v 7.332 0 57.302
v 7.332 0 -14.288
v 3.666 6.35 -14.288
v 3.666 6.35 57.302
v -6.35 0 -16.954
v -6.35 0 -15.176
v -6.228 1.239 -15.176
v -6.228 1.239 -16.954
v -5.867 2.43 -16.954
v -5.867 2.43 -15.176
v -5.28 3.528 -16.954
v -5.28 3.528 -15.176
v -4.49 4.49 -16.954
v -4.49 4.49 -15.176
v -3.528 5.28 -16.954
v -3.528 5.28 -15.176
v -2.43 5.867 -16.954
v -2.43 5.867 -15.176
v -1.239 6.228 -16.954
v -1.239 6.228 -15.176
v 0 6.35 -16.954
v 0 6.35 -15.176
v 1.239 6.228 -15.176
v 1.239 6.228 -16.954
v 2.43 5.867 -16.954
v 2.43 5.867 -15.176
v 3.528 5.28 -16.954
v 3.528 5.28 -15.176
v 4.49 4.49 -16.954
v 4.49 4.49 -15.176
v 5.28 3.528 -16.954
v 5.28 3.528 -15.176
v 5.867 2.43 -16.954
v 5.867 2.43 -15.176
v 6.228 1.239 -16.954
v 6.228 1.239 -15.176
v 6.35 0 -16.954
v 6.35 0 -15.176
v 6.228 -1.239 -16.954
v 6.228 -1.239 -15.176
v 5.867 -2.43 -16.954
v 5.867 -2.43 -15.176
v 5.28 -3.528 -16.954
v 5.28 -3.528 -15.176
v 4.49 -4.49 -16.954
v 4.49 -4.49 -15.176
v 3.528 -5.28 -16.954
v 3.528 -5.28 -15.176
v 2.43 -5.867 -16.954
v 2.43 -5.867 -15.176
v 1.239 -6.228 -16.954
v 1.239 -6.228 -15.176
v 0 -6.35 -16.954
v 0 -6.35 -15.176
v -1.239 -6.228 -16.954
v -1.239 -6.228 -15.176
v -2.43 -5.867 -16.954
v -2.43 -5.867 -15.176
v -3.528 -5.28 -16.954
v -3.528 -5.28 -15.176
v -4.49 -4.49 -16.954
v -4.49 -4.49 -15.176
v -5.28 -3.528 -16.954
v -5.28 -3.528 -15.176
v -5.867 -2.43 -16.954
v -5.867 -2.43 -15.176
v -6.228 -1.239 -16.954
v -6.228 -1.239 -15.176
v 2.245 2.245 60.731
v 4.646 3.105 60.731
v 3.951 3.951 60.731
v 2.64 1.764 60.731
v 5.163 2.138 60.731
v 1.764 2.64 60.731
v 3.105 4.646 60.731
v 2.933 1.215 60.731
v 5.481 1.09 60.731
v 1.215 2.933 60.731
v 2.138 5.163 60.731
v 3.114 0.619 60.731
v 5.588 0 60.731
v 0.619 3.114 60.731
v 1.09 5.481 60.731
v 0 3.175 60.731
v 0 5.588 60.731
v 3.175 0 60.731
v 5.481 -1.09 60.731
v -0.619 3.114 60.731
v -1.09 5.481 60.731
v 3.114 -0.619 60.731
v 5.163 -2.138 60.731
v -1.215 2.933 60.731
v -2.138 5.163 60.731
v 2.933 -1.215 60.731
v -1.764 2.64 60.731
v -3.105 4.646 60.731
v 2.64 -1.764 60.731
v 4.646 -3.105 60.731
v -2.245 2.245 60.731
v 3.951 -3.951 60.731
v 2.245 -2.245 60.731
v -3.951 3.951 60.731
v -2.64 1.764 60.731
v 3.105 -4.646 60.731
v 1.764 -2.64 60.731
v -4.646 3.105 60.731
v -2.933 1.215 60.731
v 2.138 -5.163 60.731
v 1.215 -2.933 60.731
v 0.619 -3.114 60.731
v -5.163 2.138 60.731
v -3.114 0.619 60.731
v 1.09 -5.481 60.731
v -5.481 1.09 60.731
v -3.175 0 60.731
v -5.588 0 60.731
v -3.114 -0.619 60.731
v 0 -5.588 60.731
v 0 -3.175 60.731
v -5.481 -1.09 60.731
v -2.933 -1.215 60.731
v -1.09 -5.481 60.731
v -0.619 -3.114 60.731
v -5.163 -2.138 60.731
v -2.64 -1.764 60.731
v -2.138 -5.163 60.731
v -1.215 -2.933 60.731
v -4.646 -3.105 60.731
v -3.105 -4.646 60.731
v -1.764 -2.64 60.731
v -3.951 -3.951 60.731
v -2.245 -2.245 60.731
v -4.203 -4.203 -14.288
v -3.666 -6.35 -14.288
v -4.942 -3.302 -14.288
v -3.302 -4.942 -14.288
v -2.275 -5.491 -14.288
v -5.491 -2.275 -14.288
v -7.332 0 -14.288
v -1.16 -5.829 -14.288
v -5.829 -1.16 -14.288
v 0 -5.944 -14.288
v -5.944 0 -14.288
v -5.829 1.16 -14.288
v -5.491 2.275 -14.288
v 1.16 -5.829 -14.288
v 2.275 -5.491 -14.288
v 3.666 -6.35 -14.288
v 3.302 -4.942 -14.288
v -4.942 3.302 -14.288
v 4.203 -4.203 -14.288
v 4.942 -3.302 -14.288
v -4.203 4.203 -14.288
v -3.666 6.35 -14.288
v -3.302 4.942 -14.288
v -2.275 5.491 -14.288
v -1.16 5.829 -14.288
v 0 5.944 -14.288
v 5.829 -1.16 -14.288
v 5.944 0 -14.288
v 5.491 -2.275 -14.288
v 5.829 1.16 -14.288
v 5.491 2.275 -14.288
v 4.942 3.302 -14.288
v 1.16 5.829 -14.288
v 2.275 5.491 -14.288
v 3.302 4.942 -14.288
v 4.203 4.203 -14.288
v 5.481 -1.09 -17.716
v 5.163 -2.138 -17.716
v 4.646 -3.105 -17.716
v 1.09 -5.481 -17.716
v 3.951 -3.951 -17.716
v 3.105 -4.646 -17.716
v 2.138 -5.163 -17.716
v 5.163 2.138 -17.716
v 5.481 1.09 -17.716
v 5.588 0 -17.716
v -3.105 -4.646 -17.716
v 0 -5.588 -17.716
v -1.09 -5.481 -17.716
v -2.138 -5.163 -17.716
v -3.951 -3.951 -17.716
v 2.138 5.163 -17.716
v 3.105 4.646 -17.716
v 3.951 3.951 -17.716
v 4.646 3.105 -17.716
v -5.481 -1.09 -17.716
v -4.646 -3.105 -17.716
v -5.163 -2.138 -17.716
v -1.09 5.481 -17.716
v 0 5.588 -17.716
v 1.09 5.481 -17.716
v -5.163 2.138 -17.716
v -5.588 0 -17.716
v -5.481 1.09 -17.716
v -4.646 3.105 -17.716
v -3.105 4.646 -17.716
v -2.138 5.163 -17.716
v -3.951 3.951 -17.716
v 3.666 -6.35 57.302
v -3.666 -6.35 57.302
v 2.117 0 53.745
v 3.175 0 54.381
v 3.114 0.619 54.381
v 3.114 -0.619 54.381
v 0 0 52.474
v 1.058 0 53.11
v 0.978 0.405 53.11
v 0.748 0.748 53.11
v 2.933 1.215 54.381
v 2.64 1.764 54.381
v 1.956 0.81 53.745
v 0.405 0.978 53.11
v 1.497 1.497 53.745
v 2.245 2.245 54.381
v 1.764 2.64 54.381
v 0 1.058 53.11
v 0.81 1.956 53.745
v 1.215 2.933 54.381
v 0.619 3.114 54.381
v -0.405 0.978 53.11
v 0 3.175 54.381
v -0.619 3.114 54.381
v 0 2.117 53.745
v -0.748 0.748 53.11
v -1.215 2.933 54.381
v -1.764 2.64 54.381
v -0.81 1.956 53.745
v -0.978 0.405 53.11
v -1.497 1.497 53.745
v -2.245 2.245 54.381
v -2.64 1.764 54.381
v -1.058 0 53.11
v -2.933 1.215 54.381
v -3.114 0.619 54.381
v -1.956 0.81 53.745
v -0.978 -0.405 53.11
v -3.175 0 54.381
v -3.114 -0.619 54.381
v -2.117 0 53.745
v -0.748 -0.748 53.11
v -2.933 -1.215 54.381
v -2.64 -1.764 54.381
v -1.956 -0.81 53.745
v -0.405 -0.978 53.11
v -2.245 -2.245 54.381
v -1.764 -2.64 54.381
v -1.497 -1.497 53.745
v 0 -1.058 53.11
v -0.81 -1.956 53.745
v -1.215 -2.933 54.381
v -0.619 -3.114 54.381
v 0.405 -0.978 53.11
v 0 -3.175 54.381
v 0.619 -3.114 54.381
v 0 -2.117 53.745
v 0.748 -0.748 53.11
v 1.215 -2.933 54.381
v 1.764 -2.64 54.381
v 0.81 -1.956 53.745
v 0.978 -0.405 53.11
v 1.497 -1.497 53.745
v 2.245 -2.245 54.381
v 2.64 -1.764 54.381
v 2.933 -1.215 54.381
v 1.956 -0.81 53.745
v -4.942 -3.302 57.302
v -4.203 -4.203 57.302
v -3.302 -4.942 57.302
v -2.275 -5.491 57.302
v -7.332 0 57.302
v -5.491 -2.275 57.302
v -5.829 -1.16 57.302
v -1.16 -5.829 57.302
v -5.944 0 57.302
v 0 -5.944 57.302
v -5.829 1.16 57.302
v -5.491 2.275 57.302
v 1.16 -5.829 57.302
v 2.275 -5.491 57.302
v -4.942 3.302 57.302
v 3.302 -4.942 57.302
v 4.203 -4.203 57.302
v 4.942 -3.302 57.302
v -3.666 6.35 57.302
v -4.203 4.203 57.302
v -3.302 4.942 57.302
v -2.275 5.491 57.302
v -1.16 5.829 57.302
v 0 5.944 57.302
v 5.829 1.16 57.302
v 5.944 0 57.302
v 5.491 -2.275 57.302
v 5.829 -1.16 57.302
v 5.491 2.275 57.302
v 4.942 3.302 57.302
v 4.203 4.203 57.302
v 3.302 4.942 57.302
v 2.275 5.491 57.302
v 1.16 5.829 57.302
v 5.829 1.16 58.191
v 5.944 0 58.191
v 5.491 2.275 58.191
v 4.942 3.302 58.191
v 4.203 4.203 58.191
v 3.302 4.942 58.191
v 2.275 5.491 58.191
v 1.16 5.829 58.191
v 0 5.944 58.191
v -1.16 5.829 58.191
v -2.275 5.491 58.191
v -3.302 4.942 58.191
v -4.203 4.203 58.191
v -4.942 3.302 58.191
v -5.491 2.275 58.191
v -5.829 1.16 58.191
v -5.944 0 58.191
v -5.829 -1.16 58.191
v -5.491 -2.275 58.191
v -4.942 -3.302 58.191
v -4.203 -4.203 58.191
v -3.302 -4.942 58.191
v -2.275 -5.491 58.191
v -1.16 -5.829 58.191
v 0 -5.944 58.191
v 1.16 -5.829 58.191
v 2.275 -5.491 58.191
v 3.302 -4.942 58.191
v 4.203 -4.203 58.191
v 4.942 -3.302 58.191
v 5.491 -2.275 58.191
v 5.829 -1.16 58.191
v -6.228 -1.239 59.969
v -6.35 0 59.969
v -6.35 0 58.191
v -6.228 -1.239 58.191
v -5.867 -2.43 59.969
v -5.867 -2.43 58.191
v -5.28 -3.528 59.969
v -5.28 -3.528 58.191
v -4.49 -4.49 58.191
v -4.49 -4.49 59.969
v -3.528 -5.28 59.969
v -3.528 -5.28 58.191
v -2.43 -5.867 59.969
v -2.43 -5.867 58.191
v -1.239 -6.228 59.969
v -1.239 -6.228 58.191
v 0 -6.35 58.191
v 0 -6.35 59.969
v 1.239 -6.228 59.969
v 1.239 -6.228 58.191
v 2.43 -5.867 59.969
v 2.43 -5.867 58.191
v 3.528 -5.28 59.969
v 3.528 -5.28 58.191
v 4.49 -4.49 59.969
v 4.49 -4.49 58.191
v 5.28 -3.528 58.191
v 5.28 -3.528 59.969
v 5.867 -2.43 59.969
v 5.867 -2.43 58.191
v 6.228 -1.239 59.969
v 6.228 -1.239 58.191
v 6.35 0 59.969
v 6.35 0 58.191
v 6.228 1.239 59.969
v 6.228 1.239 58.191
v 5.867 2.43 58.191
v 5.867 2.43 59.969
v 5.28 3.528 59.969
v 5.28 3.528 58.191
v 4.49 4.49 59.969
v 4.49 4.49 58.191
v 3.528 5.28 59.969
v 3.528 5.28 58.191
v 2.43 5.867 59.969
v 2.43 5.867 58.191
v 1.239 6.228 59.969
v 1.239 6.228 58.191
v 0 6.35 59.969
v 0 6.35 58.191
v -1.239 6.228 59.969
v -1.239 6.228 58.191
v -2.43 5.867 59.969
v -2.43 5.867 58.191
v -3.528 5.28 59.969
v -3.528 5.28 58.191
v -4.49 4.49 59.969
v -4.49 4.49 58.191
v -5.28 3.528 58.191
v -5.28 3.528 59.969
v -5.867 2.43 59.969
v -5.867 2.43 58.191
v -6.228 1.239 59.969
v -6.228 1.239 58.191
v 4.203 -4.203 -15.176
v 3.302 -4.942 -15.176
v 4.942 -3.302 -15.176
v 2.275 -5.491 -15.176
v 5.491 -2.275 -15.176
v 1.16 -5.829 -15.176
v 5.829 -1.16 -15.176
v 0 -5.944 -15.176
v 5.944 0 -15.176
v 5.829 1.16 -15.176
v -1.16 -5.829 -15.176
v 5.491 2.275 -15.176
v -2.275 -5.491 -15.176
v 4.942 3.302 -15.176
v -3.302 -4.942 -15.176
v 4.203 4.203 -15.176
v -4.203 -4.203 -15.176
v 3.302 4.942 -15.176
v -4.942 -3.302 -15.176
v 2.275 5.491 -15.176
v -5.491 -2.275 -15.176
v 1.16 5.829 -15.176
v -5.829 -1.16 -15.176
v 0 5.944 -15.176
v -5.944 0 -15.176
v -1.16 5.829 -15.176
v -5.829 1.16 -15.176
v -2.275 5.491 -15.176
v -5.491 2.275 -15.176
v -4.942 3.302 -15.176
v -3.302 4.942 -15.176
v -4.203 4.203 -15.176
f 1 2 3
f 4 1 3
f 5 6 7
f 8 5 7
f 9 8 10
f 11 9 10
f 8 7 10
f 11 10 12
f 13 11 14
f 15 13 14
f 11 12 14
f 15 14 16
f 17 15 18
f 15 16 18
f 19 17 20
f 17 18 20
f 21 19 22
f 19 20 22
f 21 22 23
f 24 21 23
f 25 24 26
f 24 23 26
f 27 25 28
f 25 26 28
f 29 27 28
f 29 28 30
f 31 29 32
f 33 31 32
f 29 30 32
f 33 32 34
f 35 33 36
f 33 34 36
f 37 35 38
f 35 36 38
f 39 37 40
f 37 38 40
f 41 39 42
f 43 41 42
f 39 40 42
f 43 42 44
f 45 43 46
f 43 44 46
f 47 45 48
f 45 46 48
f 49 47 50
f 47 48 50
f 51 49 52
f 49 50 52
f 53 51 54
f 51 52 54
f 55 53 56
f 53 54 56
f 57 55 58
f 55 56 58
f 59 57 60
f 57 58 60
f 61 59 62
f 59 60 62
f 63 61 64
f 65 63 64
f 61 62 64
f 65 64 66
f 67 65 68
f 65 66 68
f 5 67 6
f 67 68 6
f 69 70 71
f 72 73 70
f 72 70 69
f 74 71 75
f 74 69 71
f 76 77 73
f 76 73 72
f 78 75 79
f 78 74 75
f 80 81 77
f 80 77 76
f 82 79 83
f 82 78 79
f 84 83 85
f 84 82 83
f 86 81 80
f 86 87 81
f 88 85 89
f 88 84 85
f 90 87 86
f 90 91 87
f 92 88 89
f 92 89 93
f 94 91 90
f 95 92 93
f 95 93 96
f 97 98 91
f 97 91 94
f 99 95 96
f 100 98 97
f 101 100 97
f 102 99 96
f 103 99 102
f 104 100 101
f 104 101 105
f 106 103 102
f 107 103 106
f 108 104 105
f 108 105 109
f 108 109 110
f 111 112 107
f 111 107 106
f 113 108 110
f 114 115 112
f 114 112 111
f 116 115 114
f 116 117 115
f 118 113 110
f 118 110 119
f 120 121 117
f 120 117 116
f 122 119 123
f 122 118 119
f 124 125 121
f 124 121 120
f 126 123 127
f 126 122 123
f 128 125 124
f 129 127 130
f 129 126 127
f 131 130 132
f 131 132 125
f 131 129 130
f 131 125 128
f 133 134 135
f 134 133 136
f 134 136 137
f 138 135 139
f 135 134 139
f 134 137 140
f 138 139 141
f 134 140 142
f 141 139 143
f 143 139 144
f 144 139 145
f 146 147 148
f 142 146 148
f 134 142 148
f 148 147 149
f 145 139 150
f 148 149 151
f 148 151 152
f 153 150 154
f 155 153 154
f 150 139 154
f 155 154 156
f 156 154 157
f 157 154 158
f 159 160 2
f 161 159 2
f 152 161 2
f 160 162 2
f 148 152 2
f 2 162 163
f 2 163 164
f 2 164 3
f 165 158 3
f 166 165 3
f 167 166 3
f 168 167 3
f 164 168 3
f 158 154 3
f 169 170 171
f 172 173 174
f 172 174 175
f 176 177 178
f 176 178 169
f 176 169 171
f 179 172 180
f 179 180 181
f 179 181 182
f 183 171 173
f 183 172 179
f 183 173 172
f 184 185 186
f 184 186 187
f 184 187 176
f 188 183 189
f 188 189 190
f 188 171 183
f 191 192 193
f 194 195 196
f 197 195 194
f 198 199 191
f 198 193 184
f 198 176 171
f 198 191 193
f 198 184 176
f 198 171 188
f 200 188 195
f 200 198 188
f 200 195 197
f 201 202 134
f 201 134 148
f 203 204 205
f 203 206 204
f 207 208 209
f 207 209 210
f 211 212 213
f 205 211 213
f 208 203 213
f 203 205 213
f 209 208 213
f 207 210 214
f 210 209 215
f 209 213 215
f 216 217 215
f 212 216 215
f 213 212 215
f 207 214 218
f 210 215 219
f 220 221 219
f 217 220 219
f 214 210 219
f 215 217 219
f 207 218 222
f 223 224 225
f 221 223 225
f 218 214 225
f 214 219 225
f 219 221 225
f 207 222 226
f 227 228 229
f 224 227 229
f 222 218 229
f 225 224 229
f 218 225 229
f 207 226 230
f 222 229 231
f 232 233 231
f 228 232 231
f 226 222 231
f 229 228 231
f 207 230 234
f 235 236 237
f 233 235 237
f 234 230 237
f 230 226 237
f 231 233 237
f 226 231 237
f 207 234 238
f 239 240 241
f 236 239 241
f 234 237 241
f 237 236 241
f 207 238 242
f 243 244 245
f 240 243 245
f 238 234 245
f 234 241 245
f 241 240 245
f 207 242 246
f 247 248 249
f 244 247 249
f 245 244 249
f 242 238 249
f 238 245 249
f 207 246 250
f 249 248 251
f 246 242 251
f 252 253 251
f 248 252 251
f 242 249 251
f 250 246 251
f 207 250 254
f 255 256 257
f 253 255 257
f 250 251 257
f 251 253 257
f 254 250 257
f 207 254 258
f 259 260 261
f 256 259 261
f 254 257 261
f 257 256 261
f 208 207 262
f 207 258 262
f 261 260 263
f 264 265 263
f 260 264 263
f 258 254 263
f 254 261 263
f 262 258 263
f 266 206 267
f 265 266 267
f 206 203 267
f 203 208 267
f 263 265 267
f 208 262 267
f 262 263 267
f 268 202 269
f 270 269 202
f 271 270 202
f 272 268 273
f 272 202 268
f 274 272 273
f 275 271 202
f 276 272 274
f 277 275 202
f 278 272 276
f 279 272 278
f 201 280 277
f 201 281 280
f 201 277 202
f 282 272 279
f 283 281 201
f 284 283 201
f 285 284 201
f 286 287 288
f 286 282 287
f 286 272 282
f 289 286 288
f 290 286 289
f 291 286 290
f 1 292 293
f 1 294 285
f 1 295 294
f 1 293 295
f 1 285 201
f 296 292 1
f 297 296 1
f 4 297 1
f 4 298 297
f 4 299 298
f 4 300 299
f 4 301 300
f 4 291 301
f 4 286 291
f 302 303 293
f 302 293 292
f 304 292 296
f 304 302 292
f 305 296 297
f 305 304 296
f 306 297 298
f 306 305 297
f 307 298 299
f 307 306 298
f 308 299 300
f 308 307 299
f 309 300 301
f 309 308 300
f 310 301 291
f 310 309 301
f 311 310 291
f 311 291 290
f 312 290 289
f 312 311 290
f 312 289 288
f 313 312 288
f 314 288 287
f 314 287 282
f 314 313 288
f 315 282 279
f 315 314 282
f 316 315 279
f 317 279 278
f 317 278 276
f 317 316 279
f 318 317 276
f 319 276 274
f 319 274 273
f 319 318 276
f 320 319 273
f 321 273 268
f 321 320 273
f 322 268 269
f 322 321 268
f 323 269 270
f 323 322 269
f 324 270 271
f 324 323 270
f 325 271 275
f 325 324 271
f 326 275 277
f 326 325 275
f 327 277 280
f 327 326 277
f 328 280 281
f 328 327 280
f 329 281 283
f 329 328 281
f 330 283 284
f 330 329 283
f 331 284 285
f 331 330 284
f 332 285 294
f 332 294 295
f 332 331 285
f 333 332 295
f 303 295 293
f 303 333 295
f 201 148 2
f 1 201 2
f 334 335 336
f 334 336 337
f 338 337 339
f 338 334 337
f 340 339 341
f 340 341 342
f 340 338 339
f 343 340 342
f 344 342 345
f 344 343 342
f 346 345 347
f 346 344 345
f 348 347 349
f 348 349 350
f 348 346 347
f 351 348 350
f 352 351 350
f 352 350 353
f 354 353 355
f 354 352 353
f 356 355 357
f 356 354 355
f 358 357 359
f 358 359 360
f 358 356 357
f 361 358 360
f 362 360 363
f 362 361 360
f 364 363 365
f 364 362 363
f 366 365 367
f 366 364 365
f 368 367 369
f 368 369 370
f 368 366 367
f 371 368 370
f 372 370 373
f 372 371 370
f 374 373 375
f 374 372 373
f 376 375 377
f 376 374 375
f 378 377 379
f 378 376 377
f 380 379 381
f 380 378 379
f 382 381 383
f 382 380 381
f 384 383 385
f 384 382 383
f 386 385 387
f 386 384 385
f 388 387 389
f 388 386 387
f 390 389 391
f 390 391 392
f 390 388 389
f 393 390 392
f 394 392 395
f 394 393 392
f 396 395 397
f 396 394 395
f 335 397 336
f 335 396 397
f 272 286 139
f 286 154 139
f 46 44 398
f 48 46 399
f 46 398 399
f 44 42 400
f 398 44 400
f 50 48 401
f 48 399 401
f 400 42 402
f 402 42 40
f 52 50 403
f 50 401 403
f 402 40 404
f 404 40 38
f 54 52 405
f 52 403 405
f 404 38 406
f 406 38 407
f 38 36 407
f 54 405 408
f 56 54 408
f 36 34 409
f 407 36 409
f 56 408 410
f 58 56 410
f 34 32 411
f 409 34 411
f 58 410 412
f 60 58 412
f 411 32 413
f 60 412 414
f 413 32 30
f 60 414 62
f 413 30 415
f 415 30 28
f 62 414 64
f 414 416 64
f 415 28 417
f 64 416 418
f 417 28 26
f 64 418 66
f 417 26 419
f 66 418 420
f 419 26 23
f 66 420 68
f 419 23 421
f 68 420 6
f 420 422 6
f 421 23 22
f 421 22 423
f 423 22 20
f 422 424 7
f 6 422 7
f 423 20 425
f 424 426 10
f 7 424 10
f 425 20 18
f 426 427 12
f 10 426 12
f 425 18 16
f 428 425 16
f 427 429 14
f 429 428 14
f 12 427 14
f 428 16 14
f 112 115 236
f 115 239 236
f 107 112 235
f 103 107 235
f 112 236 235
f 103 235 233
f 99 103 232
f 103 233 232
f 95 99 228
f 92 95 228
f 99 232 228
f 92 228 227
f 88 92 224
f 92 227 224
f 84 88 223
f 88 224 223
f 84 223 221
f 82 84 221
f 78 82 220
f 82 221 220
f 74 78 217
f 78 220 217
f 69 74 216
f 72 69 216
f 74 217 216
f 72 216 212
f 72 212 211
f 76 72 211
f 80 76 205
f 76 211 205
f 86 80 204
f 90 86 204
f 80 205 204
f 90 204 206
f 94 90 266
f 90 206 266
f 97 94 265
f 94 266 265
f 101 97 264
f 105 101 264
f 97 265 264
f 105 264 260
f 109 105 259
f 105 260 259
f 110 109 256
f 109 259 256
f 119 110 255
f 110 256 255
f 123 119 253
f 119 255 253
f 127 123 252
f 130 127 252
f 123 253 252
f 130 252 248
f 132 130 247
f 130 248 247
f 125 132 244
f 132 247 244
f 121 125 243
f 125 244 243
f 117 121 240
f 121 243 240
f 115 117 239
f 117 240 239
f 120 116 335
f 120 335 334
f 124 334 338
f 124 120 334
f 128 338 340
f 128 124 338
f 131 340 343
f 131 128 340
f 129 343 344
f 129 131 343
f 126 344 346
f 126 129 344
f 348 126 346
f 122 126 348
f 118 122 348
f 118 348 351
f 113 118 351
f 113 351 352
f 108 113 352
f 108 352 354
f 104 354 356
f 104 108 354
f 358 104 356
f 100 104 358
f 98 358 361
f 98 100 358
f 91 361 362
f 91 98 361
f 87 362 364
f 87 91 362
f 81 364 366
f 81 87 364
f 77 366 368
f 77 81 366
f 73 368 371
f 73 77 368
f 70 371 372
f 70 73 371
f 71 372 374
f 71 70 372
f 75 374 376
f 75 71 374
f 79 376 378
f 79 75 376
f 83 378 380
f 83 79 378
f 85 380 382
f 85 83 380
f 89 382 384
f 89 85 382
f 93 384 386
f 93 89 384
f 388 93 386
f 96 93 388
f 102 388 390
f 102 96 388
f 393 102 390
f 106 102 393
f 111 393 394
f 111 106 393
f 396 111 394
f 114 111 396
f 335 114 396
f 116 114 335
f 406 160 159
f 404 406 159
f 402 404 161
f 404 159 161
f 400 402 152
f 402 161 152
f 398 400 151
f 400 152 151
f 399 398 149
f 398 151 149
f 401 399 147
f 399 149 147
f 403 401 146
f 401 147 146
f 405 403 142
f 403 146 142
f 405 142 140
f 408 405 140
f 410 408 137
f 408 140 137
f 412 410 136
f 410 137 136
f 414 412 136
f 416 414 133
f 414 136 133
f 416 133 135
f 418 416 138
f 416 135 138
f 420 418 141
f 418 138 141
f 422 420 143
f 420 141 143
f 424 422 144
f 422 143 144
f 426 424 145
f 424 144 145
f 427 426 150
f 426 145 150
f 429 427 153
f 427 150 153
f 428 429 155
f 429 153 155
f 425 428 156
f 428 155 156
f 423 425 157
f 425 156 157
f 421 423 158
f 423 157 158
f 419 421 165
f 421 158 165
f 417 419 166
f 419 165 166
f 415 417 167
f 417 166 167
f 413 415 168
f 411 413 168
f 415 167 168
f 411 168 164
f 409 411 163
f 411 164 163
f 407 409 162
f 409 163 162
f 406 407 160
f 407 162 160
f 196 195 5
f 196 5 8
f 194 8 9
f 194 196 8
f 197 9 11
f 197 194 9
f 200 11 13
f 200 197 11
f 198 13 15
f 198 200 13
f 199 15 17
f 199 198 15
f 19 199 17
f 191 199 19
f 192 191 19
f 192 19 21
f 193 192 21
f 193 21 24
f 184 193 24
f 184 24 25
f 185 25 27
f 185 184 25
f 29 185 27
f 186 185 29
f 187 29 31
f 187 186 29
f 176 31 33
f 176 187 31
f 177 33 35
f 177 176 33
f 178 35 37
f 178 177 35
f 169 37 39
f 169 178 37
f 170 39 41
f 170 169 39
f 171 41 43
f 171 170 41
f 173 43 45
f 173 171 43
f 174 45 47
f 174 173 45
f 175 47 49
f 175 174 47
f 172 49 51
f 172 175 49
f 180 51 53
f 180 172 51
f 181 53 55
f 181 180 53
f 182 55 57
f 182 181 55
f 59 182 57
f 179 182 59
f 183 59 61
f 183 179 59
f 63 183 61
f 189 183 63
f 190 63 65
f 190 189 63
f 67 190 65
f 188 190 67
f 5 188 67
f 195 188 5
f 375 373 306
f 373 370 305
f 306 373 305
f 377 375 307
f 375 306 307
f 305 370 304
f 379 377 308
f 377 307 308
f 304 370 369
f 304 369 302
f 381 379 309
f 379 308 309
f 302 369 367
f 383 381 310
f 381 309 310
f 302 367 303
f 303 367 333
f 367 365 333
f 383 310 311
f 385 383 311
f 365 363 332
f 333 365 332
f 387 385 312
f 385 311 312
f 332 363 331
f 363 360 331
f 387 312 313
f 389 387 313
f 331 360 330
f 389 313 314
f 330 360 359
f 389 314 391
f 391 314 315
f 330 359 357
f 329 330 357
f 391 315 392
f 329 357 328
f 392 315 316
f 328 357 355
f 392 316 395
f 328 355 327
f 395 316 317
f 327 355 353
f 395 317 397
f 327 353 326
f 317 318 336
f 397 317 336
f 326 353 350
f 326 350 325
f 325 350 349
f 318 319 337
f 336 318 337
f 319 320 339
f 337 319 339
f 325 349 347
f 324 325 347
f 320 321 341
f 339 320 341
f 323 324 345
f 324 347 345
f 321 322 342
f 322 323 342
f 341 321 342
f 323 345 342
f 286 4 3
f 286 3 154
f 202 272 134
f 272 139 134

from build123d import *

# Parameters (mm, degrees)
BOSS_EXTRUDE1_DEPTH             = 14.2875
SKETCH2_R                       = 5.9436
BOSS_EXTRUDE2_DEPTH             = 0.889
SKETCH3_R                       = 6.35
BOSS_EXTRUDE3_DEPTH             = 2.54
CHAMFER1_SIZE                   = 0.762
BOSS_EXTRUDE4_DEPTH             = 43.0149
BOSS_EXTRUDE5_START             = 0.889
SKETCH6_R                       = 5.9436
BOSS_EXTRUDE5_DEPTH             = 0.889
BOSS_EXTRUDE6_START             = 2.54
SKETCH7_R                       = 6.35
BOSS_EXTRUDE6_DEPTH             = 2.54
CHAMFER2_SIZE                   = 0.762
F_1_4_0_25_DIAMETER_HOLE1_D     = 6.35
F_1_4_0_25_DIAMETER_HOLE1_DEPTH = 6.35
F_1_4_0_25_DIAMETER_HOLE1_TIP   = 1.907732465


with BuildPart() as part:
    # Sketch1 → Boss-Extrude1 (new, symmetric)
    with BuildSketch(Plane.XY):
        Polygon((7.332348419, 0), (3.666174209, 6.35), (-3.666174209, 6.35), (-7.332348419, 0), (-3.666174209, -6.35), (3.666174209, -6.35), align=None)
    extrude(amount=BOSS_EXTRUDE1_DEPTH, both=True)

    # Sketch2 → Boss-Extrude2 (add)
    with BuildSketch(Plane(origin=(0, 0, -14.2875), x_dir=(-1, 0, 0), z_dir=(0, 0, -1))):
        with Locations(Location((0, 0, 0), (0, 0, 180))):
            Circle(SKETCH2_R)
    extrude(amount=BOSS_EXTRUDE2_DEPTH)

    # Sketch3 → Boss-Extrude3 (add)
    with BuildSketch(Plane(origin=(0, 0, -15.1765), x_dir=(-1, 0, 0), z_dir=(0, 0, -1))):
        Circle(SKETCH3_R)
    extrude(amount=BOSS_EXTRUDE3_DEPTH)

    # Chamfer1
    chamfer1_edges = [part.edges().sort_by_distance(p)[0] for p in [
        (6.35, 0, -17.7165),
    ]]
    chamfer(chamfer1_edges, length=CHAMFER1_SIZE)

    # Sketch5 → Boss-Extrude4 (add)
    with BuildSketch(Plane.XY.offset(14.2875)):
        Polygon((3.666174209, 6.35), (-3.666174209, 6.35), (-7.332348419, 0), (-3.666174209, -6.35), (3.666174209, -6.35), (7.332348419, 0), align=None)
    extrude(amount=BOSS_EXTRUDE4_DEPTH)

    # Sketch6 → Boss-Extrude5 (add)
    with BuildSketch(Plane.XY.offset(57.3024).offset(BOSS_EXTRUDE5_START)):
        Circle(SKETCH6_R)
    extrude(amount=-BOSS_EXTRUDE5_DEPTH)

    # Sketch7 → Boss-Extrude6 (add)
    with BuildSketch(Plane.XY.offset(58.1914).offset(BOSS_EXTRUDE6_START)):
        with Locations(Location((0, 0, 0), (0, 0, 180))):
            Circle(SKETCH7_R)
    extrude(amount=-BOSS_EXTRUDE6_DEPTH)

    # Chamfer2
    chamfer2_edges = [part.edges().sort_by_distance(p)[0] for p in [
        (6.35, 0, 60.7314),
    ]]
    chamfer(chamfer2_edges, length=CHAMFER2_SIZE)

    # 1/4 (0.25) Diameter Hole1
    with Locations(Plane.XY.offset(60.7314)):
        with Locations((0, 0)):
            Hole(F_1_4_0_25_DIAMETER_HOLE1_D / 2, depth=F_1_4_0_25_DIAMETER_HOLE1_DEPTH)
            with Locations((0, 0, -(F_1_4_0_25_DIAMETER_HOLE1_DEPTH + F_1_4_0_25_DIAMETER_HOLE1_TIP / 2))):  # 118° drill point
                Cone(0, F_1_4_0_25_DIAMETER_HOLE1_D / 2, F_1_4_0_25_DIAMETER_HOLE1_TIP, mode=Mode.SUBTRACT)


solid = part.part
